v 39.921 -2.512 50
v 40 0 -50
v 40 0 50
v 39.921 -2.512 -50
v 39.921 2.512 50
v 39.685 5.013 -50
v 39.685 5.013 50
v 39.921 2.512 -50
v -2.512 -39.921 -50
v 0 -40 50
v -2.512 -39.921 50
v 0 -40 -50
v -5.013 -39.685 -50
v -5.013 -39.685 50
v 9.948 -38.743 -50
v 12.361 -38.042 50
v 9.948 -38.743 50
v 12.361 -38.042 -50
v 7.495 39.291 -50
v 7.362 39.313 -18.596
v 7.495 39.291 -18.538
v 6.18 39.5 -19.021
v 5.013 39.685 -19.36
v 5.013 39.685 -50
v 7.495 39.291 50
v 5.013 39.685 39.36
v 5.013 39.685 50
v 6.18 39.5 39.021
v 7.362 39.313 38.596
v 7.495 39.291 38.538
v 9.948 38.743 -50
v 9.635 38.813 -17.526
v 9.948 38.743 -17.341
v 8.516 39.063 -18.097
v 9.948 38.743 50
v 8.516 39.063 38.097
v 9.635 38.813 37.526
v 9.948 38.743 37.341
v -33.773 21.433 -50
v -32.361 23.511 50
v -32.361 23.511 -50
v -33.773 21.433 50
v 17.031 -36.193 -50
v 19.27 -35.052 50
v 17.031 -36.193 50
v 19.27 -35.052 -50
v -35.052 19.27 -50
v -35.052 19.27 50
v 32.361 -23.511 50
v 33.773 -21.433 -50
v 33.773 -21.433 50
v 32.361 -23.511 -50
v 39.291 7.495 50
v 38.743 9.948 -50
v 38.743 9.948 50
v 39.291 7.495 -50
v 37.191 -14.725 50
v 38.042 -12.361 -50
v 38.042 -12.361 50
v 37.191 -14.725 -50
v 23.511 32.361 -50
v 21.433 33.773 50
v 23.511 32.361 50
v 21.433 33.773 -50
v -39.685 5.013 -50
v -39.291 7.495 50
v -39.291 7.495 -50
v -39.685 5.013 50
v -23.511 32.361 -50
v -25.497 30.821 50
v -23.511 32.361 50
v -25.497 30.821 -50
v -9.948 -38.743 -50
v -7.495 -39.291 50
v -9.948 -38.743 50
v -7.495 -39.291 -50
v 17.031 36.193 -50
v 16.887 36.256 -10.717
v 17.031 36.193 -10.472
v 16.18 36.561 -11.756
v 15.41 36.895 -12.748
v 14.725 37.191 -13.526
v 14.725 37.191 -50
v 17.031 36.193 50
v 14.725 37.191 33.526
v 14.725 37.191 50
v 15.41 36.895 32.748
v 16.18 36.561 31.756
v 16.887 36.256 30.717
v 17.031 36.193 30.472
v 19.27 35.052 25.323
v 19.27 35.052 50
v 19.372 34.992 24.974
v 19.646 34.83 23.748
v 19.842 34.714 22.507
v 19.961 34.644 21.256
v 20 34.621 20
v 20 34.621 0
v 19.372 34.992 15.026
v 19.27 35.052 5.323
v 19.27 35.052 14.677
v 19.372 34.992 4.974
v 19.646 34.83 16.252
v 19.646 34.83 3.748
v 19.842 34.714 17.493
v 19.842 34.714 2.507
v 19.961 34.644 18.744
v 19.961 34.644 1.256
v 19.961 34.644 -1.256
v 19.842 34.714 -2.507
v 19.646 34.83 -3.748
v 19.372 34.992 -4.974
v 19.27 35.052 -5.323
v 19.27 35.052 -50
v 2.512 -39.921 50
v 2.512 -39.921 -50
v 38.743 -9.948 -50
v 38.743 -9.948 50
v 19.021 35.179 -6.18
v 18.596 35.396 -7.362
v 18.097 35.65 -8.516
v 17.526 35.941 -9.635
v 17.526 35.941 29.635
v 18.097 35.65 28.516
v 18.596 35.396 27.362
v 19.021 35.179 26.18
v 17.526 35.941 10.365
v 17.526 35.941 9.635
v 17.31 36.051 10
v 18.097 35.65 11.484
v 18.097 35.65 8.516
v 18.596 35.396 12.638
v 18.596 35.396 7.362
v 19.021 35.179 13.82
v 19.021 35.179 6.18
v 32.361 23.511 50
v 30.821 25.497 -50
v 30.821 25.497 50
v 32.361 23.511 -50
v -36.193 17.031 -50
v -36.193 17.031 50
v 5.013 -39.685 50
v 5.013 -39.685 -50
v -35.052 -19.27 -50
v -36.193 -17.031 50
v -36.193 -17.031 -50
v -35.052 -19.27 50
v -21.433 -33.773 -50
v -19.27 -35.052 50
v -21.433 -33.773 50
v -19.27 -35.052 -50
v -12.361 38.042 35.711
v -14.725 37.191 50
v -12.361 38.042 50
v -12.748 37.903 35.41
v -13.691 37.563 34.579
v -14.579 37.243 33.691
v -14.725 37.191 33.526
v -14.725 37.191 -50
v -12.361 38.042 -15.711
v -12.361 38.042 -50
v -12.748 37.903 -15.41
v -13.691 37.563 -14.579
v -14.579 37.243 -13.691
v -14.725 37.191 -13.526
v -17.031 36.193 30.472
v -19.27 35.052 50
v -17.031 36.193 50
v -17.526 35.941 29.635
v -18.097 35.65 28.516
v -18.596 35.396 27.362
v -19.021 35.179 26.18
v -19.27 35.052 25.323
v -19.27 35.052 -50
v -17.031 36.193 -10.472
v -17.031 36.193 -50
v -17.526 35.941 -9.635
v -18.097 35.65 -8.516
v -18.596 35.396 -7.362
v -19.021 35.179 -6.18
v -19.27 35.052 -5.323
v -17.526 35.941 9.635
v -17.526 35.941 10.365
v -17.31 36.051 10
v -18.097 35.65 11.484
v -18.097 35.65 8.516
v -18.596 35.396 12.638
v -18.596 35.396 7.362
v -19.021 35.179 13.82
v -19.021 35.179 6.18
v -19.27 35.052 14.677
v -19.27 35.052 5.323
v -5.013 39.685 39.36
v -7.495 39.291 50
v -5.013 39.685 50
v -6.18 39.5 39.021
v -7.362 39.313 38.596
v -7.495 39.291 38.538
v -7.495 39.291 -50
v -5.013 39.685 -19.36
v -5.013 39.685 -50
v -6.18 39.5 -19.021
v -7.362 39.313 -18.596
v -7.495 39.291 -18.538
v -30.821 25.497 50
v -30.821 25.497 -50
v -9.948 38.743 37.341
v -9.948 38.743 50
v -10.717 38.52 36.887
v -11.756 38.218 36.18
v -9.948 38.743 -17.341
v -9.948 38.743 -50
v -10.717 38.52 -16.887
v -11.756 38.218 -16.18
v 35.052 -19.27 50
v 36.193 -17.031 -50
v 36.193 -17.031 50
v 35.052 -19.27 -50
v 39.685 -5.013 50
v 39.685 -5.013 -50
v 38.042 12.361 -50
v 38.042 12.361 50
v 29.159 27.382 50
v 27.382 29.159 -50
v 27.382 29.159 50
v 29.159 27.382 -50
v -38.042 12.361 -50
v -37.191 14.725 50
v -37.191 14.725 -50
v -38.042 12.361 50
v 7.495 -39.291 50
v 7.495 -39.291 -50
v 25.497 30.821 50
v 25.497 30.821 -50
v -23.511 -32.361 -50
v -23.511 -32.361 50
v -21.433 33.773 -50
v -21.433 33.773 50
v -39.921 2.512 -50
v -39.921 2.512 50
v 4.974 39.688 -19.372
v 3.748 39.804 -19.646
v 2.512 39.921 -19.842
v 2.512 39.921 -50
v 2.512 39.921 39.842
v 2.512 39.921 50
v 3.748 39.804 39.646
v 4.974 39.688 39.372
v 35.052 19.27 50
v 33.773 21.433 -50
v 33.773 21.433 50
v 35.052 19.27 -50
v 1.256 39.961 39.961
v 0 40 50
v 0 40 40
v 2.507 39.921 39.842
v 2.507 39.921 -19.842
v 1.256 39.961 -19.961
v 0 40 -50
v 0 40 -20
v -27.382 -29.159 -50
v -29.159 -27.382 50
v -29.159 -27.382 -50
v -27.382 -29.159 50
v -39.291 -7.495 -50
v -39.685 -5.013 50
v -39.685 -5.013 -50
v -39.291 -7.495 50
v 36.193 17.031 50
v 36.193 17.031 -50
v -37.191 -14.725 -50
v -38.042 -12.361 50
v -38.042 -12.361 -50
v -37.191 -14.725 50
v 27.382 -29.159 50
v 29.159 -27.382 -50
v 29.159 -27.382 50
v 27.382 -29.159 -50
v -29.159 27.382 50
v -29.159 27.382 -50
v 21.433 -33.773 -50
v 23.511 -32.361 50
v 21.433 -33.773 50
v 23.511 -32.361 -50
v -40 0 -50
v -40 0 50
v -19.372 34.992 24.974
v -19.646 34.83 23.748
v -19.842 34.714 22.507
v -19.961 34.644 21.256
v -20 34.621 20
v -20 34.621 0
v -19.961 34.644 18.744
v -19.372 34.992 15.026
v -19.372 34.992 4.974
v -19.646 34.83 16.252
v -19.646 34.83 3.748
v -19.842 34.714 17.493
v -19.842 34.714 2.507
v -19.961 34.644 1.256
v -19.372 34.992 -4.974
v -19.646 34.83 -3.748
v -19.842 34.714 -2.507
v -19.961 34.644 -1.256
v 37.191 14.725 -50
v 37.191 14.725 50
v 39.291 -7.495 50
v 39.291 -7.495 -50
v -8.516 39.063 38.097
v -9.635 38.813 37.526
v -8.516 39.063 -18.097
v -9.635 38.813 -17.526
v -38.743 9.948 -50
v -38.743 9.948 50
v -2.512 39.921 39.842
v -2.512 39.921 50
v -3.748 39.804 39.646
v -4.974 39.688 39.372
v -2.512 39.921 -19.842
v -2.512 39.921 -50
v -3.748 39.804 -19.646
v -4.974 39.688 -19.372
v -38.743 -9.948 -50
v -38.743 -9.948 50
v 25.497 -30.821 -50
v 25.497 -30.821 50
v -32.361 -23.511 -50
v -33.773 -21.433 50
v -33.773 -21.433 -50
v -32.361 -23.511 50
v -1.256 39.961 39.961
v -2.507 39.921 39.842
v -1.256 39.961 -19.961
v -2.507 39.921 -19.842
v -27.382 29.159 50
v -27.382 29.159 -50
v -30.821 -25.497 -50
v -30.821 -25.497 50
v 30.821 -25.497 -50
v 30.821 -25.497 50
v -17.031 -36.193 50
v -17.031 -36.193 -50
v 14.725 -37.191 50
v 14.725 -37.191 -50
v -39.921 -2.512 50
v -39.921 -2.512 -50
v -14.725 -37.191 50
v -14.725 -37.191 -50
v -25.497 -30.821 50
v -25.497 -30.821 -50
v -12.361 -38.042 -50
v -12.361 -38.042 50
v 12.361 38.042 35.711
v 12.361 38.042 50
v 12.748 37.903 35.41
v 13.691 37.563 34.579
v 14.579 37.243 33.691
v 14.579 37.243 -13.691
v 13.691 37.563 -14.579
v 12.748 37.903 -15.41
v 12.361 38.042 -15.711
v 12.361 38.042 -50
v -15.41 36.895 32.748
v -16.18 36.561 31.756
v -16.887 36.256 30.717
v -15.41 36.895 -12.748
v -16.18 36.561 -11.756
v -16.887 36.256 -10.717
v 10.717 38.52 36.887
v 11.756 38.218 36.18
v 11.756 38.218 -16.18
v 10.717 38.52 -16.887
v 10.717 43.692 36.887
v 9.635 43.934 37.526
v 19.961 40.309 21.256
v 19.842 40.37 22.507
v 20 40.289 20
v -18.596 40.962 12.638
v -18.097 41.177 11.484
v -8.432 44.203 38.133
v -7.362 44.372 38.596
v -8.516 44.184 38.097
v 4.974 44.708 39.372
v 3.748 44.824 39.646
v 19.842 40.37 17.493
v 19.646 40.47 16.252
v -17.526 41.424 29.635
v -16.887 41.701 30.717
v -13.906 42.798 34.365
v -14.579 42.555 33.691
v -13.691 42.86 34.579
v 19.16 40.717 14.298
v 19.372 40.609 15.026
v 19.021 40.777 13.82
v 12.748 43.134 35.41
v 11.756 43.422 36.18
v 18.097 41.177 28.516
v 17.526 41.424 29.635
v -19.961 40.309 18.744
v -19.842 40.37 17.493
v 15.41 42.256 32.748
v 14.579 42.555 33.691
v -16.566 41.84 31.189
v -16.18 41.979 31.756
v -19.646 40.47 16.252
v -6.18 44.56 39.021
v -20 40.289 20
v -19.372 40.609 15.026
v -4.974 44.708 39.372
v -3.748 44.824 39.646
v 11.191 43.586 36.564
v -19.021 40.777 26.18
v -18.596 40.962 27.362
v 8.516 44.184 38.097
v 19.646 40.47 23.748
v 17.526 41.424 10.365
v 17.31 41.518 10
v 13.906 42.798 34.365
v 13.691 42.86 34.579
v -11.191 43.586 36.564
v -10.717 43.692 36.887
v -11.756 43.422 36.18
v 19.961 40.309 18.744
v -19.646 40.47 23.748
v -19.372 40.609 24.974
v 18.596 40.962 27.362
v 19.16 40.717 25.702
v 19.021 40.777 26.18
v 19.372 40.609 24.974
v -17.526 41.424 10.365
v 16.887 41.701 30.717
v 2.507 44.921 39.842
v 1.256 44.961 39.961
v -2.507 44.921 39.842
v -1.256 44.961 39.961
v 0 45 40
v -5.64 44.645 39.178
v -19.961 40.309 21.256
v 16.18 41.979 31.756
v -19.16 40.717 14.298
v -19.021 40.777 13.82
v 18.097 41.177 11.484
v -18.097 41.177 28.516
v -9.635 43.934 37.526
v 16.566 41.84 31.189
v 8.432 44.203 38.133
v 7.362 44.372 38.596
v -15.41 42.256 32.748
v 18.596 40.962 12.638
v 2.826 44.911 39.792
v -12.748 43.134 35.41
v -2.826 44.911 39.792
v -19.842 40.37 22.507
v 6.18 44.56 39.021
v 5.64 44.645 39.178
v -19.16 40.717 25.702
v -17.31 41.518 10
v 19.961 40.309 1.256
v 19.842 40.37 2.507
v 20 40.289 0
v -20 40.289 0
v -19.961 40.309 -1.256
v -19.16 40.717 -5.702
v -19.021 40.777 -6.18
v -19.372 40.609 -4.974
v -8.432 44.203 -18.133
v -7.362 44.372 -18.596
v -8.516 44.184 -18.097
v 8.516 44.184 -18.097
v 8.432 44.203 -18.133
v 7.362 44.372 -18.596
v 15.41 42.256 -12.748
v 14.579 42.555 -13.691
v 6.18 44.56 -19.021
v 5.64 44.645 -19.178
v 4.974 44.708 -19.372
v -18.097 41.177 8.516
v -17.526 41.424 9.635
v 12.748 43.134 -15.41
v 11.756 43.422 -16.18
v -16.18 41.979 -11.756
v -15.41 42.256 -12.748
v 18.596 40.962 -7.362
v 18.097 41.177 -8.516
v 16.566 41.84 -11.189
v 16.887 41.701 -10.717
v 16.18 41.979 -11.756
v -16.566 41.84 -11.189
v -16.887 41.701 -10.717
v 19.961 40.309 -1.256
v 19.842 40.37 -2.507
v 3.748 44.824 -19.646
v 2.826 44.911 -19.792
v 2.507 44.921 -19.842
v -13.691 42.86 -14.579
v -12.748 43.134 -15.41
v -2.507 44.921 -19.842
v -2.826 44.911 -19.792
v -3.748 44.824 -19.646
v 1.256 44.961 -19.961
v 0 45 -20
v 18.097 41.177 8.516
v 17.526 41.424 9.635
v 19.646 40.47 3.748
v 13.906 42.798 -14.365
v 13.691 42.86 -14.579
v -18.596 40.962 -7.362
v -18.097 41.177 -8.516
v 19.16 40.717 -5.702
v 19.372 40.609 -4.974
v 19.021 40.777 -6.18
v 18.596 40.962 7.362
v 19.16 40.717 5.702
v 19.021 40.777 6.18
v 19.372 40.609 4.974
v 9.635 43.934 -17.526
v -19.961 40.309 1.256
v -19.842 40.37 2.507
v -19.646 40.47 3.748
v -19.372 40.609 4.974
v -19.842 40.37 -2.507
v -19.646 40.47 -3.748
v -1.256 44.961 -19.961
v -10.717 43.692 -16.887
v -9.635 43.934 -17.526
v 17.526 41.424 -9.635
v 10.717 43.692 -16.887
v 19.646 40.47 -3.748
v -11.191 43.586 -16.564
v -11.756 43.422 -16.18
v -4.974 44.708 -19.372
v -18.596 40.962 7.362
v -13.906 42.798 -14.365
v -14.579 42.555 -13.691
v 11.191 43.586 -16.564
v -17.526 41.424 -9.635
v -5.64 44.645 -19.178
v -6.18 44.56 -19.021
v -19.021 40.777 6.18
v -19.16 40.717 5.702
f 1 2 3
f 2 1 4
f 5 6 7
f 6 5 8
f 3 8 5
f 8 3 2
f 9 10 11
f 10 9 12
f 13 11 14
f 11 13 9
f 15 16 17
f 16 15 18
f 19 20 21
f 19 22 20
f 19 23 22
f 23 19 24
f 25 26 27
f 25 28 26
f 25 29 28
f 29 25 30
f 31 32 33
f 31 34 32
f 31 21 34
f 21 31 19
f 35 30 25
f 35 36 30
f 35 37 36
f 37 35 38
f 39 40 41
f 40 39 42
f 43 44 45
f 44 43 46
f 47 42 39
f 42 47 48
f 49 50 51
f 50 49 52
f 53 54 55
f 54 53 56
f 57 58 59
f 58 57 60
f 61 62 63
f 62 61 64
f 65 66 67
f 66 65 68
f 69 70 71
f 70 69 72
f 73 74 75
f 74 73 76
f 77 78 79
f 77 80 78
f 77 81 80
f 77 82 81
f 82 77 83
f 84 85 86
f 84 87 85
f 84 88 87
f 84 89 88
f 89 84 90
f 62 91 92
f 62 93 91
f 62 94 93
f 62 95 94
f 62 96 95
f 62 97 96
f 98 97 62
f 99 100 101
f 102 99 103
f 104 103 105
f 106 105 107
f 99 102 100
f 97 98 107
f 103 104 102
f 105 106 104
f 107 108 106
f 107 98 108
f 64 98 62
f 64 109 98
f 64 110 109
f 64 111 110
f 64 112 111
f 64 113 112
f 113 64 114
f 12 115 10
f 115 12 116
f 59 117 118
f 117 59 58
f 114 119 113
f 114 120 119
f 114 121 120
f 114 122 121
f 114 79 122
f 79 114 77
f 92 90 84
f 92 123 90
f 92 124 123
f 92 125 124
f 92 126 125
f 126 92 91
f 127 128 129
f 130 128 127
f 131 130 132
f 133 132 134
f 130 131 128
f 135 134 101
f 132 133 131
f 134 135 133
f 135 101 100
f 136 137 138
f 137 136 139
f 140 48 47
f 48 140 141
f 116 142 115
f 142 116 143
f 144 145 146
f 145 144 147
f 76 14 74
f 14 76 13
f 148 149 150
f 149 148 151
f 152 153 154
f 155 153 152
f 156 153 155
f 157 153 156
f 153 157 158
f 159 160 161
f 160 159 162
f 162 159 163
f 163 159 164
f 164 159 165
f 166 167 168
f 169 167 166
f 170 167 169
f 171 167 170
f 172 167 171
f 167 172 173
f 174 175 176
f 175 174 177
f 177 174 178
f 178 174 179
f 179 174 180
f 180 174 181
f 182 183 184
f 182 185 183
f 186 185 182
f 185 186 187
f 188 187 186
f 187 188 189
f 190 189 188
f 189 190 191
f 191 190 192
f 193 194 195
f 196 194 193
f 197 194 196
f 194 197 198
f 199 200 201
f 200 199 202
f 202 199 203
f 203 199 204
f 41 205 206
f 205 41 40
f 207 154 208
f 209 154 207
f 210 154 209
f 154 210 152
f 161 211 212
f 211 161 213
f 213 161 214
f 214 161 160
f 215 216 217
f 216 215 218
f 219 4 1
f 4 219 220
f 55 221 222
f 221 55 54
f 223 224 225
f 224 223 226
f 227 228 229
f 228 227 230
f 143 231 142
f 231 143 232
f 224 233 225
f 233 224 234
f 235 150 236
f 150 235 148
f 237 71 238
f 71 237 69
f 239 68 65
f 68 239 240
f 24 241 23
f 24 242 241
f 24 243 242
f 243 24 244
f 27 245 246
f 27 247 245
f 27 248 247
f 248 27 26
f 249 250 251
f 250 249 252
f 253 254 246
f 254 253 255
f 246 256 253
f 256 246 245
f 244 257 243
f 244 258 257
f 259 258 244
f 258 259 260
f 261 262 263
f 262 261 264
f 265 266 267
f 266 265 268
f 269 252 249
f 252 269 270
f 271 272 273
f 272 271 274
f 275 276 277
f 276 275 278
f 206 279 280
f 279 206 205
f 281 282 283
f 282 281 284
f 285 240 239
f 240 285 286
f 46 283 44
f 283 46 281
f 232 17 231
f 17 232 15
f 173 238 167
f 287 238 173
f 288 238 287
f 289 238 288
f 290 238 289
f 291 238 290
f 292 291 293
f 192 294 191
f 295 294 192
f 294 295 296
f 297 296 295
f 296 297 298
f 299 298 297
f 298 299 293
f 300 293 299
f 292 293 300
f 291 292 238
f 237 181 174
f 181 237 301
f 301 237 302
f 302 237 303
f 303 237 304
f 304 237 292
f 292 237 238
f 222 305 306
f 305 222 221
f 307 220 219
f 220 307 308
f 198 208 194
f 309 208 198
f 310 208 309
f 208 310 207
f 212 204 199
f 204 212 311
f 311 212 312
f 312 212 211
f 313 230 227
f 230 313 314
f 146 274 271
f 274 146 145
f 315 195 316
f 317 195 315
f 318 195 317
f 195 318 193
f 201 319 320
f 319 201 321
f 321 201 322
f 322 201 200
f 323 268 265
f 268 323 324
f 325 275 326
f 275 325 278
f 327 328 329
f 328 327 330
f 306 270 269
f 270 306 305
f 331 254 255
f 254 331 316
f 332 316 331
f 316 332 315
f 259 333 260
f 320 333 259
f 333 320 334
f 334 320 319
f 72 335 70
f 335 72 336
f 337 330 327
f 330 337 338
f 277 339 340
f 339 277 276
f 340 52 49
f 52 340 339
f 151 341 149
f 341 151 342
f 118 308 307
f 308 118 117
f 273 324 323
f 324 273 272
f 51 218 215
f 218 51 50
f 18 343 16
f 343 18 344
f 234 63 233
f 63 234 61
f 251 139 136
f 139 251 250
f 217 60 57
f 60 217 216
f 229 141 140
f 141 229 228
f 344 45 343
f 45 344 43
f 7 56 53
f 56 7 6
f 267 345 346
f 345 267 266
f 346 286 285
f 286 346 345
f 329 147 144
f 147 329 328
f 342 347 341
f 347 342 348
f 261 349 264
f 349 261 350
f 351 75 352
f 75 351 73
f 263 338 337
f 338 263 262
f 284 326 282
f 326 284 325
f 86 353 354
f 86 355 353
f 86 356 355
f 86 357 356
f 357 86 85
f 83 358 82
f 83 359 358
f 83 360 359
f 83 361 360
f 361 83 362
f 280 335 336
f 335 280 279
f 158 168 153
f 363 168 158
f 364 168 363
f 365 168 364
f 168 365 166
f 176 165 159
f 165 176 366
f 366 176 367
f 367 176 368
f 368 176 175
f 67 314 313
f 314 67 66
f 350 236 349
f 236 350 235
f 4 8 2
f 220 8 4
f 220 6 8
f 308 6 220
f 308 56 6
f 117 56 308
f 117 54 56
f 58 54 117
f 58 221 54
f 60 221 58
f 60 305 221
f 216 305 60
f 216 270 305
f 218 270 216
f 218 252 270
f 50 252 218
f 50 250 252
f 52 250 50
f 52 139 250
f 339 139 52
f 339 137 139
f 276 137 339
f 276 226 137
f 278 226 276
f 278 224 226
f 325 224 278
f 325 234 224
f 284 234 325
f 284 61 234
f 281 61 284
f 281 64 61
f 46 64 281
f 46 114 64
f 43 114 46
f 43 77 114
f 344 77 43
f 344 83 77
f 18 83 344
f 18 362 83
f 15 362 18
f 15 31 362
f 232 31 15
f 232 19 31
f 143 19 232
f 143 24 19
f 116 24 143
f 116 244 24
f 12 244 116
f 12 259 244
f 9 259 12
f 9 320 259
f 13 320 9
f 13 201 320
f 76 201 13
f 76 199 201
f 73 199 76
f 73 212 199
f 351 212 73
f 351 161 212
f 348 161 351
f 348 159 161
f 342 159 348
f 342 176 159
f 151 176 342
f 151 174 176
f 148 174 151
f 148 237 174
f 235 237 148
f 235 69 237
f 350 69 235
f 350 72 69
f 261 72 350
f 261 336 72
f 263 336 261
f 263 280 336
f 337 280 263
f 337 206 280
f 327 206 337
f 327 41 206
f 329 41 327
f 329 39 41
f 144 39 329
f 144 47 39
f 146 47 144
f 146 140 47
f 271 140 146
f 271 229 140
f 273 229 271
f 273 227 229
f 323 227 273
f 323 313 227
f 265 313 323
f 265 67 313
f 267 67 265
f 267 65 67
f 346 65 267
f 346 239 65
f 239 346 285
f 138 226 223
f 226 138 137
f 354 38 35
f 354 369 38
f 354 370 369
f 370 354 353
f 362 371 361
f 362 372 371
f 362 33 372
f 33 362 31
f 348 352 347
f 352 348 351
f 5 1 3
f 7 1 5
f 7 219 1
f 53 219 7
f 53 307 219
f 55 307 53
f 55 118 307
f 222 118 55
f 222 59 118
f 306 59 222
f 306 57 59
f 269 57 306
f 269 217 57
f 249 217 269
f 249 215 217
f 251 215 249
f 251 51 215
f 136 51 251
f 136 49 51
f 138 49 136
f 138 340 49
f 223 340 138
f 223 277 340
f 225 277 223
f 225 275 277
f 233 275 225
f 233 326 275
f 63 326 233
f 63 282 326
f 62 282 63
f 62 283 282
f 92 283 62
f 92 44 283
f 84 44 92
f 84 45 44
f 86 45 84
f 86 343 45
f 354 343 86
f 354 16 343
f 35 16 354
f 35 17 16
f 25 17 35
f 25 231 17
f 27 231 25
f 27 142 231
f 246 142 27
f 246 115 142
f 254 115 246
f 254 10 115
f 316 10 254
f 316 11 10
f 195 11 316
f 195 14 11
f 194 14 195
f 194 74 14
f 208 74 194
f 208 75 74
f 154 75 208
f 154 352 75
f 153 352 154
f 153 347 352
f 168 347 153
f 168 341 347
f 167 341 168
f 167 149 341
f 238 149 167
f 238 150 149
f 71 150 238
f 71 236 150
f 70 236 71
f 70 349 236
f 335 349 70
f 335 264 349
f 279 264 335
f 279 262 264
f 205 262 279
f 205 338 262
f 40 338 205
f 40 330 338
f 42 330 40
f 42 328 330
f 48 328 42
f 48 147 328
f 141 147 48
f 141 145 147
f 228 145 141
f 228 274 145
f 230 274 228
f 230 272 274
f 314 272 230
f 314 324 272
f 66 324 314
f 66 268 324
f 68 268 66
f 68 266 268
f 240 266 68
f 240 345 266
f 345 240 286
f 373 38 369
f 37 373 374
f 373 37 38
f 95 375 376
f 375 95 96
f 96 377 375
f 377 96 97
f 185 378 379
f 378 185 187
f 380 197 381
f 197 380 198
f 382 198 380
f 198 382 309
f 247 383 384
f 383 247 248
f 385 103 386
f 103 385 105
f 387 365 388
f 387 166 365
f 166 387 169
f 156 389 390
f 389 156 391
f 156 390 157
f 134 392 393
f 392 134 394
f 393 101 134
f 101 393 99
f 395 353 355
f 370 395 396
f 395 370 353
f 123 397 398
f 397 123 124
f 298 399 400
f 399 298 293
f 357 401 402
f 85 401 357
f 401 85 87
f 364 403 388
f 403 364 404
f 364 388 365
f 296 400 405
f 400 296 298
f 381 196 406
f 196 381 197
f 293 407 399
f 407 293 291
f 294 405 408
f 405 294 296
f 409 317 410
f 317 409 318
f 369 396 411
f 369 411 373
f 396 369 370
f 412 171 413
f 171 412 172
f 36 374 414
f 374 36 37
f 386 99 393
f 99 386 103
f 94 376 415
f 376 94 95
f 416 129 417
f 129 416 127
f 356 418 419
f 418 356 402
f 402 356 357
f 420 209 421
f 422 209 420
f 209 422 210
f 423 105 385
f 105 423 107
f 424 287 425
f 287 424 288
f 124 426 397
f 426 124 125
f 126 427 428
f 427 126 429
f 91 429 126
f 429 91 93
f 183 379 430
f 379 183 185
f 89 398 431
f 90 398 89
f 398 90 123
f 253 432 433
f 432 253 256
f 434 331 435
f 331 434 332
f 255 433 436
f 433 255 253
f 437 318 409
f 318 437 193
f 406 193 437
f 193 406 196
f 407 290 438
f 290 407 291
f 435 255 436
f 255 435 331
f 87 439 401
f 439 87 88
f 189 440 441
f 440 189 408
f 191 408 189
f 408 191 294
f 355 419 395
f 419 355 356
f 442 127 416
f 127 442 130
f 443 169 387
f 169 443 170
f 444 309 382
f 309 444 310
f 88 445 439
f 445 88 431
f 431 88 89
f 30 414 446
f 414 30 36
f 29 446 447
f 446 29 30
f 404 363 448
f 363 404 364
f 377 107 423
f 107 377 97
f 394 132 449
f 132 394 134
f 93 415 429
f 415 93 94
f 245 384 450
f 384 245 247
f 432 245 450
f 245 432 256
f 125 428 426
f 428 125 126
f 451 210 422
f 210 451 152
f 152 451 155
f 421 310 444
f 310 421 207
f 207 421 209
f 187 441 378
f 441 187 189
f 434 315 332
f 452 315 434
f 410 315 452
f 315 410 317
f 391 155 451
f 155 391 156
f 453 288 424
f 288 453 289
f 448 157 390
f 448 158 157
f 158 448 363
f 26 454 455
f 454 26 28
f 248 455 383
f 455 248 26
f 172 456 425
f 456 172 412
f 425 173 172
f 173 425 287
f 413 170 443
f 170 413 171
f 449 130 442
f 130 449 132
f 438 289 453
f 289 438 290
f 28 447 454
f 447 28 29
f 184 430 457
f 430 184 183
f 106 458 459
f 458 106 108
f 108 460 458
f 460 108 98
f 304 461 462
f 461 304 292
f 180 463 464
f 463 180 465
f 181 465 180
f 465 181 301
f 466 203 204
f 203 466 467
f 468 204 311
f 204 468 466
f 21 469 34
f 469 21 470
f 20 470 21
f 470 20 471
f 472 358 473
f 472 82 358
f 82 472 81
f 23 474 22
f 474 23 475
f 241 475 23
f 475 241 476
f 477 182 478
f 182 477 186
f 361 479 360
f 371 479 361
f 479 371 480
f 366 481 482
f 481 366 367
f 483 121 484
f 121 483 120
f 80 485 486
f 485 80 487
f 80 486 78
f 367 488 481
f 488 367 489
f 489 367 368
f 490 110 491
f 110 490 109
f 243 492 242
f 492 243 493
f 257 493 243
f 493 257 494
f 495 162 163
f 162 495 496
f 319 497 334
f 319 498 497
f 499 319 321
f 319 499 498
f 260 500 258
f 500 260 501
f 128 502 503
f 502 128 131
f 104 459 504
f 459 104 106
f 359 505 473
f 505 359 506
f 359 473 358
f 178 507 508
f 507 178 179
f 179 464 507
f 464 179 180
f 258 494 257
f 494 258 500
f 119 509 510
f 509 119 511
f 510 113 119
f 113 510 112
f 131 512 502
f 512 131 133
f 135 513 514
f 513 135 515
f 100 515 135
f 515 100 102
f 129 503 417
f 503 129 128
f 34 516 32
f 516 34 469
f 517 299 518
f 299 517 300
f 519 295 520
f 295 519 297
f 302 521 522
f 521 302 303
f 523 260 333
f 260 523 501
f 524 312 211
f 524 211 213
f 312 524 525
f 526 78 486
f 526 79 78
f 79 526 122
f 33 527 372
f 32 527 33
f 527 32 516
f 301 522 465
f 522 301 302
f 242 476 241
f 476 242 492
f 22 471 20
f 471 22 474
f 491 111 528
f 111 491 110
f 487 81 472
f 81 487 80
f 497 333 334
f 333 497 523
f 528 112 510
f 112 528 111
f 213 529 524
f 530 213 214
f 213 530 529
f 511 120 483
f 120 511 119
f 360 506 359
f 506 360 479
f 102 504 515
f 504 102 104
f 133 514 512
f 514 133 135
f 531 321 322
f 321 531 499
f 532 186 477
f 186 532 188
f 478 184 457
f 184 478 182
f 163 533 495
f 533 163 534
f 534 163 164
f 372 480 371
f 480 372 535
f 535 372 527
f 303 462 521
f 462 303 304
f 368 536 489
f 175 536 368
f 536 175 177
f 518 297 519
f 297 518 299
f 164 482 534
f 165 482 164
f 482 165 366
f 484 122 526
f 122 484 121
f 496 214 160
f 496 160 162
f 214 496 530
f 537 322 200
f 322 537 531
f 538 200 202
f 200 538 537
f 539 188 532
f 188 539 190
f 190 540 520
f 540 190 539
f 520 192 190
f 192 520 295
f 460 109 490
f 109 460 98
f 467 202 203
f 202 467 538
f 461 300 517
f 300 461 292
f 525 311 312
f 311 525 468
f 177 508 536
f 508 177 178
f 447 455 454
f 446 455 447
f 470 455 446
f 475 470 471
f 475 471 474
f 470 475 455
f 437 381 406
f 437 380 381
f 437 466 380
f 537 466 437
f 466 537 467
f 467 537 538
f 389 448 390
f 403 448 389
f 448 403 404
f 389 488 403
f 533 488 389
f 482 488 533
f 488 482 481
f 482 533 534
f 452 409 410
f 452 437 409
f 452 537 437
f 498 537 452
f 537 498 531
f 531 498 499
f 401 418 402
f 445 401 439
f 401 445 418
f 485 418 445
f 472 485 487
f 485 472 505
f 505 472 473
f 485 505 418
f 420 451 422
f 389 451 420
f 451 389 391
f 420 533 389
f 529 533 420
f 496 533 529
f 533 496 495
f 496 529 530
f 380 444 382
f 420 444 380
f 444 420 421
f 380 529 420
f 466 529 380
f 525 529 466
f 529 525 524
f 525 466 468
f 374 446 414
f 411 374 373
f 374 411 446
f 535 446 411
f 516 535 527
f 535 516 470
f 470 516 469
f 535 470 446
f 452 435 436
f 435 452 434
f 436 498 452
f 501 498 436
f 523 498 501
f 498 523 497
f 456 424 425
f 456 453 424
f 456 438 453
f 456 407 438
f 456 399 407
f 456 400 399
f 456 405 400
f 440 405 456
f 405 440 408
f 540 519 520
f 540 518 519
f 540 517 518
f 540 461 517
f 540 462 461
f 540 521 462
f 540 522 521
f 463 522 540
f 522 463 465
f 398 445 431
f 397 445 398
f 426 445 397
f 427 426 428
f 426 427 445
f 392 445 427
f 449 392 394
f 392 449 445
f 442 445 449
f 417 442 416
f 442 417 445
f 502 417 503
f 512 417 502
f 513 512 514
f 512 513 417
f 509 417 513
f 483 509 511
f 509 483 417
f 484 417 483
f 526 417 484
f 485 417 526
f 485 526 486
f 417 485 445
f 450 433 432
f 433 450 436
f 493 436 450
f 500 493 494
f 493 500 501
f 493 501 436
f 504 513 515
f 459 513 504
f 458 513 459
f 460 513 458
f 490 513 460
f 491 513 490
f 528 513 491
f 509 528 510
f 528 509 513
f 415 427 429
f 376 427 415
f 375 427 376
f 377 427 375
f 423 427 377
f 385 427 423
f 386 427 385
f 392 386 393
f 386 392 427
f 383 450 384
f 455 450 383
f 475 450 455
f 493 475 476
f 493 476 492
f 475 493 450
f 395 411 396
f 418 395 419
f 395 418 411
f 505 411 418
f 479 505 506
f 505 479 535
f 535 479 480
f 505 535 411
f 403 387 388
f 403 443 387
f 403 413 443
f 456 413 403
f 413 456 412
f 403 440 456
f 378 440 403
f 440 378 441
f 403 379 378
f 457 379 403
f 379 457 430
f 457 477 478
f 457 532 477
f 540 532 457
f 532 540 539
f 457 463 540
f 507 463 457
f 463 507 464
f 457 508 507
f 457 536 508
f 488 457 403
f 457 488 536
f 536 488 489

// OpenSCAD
$fn = 100;

difference() {


    union() {

        //cube([15, 15, 40], true);
        cylinder(100, 40, 40, true);
       
        translate([0, 20, 20]) rotate([90, 0 ,0]) cylinder(50, 20, 20, true);
        translate([0, 20, 0]) rotate([90, 0 ,0]) cylinder(50, 20, 20, true);
        // cylinder(20, 40, 40, true);
       
    }

    union() {
        difference() {
            cylinder(110, 60, 60, true);
            cylinder(120, 45, 45, true);
        }
    }


}

 translate([0, 150, 150]) cube([60, 50, 0], true);
